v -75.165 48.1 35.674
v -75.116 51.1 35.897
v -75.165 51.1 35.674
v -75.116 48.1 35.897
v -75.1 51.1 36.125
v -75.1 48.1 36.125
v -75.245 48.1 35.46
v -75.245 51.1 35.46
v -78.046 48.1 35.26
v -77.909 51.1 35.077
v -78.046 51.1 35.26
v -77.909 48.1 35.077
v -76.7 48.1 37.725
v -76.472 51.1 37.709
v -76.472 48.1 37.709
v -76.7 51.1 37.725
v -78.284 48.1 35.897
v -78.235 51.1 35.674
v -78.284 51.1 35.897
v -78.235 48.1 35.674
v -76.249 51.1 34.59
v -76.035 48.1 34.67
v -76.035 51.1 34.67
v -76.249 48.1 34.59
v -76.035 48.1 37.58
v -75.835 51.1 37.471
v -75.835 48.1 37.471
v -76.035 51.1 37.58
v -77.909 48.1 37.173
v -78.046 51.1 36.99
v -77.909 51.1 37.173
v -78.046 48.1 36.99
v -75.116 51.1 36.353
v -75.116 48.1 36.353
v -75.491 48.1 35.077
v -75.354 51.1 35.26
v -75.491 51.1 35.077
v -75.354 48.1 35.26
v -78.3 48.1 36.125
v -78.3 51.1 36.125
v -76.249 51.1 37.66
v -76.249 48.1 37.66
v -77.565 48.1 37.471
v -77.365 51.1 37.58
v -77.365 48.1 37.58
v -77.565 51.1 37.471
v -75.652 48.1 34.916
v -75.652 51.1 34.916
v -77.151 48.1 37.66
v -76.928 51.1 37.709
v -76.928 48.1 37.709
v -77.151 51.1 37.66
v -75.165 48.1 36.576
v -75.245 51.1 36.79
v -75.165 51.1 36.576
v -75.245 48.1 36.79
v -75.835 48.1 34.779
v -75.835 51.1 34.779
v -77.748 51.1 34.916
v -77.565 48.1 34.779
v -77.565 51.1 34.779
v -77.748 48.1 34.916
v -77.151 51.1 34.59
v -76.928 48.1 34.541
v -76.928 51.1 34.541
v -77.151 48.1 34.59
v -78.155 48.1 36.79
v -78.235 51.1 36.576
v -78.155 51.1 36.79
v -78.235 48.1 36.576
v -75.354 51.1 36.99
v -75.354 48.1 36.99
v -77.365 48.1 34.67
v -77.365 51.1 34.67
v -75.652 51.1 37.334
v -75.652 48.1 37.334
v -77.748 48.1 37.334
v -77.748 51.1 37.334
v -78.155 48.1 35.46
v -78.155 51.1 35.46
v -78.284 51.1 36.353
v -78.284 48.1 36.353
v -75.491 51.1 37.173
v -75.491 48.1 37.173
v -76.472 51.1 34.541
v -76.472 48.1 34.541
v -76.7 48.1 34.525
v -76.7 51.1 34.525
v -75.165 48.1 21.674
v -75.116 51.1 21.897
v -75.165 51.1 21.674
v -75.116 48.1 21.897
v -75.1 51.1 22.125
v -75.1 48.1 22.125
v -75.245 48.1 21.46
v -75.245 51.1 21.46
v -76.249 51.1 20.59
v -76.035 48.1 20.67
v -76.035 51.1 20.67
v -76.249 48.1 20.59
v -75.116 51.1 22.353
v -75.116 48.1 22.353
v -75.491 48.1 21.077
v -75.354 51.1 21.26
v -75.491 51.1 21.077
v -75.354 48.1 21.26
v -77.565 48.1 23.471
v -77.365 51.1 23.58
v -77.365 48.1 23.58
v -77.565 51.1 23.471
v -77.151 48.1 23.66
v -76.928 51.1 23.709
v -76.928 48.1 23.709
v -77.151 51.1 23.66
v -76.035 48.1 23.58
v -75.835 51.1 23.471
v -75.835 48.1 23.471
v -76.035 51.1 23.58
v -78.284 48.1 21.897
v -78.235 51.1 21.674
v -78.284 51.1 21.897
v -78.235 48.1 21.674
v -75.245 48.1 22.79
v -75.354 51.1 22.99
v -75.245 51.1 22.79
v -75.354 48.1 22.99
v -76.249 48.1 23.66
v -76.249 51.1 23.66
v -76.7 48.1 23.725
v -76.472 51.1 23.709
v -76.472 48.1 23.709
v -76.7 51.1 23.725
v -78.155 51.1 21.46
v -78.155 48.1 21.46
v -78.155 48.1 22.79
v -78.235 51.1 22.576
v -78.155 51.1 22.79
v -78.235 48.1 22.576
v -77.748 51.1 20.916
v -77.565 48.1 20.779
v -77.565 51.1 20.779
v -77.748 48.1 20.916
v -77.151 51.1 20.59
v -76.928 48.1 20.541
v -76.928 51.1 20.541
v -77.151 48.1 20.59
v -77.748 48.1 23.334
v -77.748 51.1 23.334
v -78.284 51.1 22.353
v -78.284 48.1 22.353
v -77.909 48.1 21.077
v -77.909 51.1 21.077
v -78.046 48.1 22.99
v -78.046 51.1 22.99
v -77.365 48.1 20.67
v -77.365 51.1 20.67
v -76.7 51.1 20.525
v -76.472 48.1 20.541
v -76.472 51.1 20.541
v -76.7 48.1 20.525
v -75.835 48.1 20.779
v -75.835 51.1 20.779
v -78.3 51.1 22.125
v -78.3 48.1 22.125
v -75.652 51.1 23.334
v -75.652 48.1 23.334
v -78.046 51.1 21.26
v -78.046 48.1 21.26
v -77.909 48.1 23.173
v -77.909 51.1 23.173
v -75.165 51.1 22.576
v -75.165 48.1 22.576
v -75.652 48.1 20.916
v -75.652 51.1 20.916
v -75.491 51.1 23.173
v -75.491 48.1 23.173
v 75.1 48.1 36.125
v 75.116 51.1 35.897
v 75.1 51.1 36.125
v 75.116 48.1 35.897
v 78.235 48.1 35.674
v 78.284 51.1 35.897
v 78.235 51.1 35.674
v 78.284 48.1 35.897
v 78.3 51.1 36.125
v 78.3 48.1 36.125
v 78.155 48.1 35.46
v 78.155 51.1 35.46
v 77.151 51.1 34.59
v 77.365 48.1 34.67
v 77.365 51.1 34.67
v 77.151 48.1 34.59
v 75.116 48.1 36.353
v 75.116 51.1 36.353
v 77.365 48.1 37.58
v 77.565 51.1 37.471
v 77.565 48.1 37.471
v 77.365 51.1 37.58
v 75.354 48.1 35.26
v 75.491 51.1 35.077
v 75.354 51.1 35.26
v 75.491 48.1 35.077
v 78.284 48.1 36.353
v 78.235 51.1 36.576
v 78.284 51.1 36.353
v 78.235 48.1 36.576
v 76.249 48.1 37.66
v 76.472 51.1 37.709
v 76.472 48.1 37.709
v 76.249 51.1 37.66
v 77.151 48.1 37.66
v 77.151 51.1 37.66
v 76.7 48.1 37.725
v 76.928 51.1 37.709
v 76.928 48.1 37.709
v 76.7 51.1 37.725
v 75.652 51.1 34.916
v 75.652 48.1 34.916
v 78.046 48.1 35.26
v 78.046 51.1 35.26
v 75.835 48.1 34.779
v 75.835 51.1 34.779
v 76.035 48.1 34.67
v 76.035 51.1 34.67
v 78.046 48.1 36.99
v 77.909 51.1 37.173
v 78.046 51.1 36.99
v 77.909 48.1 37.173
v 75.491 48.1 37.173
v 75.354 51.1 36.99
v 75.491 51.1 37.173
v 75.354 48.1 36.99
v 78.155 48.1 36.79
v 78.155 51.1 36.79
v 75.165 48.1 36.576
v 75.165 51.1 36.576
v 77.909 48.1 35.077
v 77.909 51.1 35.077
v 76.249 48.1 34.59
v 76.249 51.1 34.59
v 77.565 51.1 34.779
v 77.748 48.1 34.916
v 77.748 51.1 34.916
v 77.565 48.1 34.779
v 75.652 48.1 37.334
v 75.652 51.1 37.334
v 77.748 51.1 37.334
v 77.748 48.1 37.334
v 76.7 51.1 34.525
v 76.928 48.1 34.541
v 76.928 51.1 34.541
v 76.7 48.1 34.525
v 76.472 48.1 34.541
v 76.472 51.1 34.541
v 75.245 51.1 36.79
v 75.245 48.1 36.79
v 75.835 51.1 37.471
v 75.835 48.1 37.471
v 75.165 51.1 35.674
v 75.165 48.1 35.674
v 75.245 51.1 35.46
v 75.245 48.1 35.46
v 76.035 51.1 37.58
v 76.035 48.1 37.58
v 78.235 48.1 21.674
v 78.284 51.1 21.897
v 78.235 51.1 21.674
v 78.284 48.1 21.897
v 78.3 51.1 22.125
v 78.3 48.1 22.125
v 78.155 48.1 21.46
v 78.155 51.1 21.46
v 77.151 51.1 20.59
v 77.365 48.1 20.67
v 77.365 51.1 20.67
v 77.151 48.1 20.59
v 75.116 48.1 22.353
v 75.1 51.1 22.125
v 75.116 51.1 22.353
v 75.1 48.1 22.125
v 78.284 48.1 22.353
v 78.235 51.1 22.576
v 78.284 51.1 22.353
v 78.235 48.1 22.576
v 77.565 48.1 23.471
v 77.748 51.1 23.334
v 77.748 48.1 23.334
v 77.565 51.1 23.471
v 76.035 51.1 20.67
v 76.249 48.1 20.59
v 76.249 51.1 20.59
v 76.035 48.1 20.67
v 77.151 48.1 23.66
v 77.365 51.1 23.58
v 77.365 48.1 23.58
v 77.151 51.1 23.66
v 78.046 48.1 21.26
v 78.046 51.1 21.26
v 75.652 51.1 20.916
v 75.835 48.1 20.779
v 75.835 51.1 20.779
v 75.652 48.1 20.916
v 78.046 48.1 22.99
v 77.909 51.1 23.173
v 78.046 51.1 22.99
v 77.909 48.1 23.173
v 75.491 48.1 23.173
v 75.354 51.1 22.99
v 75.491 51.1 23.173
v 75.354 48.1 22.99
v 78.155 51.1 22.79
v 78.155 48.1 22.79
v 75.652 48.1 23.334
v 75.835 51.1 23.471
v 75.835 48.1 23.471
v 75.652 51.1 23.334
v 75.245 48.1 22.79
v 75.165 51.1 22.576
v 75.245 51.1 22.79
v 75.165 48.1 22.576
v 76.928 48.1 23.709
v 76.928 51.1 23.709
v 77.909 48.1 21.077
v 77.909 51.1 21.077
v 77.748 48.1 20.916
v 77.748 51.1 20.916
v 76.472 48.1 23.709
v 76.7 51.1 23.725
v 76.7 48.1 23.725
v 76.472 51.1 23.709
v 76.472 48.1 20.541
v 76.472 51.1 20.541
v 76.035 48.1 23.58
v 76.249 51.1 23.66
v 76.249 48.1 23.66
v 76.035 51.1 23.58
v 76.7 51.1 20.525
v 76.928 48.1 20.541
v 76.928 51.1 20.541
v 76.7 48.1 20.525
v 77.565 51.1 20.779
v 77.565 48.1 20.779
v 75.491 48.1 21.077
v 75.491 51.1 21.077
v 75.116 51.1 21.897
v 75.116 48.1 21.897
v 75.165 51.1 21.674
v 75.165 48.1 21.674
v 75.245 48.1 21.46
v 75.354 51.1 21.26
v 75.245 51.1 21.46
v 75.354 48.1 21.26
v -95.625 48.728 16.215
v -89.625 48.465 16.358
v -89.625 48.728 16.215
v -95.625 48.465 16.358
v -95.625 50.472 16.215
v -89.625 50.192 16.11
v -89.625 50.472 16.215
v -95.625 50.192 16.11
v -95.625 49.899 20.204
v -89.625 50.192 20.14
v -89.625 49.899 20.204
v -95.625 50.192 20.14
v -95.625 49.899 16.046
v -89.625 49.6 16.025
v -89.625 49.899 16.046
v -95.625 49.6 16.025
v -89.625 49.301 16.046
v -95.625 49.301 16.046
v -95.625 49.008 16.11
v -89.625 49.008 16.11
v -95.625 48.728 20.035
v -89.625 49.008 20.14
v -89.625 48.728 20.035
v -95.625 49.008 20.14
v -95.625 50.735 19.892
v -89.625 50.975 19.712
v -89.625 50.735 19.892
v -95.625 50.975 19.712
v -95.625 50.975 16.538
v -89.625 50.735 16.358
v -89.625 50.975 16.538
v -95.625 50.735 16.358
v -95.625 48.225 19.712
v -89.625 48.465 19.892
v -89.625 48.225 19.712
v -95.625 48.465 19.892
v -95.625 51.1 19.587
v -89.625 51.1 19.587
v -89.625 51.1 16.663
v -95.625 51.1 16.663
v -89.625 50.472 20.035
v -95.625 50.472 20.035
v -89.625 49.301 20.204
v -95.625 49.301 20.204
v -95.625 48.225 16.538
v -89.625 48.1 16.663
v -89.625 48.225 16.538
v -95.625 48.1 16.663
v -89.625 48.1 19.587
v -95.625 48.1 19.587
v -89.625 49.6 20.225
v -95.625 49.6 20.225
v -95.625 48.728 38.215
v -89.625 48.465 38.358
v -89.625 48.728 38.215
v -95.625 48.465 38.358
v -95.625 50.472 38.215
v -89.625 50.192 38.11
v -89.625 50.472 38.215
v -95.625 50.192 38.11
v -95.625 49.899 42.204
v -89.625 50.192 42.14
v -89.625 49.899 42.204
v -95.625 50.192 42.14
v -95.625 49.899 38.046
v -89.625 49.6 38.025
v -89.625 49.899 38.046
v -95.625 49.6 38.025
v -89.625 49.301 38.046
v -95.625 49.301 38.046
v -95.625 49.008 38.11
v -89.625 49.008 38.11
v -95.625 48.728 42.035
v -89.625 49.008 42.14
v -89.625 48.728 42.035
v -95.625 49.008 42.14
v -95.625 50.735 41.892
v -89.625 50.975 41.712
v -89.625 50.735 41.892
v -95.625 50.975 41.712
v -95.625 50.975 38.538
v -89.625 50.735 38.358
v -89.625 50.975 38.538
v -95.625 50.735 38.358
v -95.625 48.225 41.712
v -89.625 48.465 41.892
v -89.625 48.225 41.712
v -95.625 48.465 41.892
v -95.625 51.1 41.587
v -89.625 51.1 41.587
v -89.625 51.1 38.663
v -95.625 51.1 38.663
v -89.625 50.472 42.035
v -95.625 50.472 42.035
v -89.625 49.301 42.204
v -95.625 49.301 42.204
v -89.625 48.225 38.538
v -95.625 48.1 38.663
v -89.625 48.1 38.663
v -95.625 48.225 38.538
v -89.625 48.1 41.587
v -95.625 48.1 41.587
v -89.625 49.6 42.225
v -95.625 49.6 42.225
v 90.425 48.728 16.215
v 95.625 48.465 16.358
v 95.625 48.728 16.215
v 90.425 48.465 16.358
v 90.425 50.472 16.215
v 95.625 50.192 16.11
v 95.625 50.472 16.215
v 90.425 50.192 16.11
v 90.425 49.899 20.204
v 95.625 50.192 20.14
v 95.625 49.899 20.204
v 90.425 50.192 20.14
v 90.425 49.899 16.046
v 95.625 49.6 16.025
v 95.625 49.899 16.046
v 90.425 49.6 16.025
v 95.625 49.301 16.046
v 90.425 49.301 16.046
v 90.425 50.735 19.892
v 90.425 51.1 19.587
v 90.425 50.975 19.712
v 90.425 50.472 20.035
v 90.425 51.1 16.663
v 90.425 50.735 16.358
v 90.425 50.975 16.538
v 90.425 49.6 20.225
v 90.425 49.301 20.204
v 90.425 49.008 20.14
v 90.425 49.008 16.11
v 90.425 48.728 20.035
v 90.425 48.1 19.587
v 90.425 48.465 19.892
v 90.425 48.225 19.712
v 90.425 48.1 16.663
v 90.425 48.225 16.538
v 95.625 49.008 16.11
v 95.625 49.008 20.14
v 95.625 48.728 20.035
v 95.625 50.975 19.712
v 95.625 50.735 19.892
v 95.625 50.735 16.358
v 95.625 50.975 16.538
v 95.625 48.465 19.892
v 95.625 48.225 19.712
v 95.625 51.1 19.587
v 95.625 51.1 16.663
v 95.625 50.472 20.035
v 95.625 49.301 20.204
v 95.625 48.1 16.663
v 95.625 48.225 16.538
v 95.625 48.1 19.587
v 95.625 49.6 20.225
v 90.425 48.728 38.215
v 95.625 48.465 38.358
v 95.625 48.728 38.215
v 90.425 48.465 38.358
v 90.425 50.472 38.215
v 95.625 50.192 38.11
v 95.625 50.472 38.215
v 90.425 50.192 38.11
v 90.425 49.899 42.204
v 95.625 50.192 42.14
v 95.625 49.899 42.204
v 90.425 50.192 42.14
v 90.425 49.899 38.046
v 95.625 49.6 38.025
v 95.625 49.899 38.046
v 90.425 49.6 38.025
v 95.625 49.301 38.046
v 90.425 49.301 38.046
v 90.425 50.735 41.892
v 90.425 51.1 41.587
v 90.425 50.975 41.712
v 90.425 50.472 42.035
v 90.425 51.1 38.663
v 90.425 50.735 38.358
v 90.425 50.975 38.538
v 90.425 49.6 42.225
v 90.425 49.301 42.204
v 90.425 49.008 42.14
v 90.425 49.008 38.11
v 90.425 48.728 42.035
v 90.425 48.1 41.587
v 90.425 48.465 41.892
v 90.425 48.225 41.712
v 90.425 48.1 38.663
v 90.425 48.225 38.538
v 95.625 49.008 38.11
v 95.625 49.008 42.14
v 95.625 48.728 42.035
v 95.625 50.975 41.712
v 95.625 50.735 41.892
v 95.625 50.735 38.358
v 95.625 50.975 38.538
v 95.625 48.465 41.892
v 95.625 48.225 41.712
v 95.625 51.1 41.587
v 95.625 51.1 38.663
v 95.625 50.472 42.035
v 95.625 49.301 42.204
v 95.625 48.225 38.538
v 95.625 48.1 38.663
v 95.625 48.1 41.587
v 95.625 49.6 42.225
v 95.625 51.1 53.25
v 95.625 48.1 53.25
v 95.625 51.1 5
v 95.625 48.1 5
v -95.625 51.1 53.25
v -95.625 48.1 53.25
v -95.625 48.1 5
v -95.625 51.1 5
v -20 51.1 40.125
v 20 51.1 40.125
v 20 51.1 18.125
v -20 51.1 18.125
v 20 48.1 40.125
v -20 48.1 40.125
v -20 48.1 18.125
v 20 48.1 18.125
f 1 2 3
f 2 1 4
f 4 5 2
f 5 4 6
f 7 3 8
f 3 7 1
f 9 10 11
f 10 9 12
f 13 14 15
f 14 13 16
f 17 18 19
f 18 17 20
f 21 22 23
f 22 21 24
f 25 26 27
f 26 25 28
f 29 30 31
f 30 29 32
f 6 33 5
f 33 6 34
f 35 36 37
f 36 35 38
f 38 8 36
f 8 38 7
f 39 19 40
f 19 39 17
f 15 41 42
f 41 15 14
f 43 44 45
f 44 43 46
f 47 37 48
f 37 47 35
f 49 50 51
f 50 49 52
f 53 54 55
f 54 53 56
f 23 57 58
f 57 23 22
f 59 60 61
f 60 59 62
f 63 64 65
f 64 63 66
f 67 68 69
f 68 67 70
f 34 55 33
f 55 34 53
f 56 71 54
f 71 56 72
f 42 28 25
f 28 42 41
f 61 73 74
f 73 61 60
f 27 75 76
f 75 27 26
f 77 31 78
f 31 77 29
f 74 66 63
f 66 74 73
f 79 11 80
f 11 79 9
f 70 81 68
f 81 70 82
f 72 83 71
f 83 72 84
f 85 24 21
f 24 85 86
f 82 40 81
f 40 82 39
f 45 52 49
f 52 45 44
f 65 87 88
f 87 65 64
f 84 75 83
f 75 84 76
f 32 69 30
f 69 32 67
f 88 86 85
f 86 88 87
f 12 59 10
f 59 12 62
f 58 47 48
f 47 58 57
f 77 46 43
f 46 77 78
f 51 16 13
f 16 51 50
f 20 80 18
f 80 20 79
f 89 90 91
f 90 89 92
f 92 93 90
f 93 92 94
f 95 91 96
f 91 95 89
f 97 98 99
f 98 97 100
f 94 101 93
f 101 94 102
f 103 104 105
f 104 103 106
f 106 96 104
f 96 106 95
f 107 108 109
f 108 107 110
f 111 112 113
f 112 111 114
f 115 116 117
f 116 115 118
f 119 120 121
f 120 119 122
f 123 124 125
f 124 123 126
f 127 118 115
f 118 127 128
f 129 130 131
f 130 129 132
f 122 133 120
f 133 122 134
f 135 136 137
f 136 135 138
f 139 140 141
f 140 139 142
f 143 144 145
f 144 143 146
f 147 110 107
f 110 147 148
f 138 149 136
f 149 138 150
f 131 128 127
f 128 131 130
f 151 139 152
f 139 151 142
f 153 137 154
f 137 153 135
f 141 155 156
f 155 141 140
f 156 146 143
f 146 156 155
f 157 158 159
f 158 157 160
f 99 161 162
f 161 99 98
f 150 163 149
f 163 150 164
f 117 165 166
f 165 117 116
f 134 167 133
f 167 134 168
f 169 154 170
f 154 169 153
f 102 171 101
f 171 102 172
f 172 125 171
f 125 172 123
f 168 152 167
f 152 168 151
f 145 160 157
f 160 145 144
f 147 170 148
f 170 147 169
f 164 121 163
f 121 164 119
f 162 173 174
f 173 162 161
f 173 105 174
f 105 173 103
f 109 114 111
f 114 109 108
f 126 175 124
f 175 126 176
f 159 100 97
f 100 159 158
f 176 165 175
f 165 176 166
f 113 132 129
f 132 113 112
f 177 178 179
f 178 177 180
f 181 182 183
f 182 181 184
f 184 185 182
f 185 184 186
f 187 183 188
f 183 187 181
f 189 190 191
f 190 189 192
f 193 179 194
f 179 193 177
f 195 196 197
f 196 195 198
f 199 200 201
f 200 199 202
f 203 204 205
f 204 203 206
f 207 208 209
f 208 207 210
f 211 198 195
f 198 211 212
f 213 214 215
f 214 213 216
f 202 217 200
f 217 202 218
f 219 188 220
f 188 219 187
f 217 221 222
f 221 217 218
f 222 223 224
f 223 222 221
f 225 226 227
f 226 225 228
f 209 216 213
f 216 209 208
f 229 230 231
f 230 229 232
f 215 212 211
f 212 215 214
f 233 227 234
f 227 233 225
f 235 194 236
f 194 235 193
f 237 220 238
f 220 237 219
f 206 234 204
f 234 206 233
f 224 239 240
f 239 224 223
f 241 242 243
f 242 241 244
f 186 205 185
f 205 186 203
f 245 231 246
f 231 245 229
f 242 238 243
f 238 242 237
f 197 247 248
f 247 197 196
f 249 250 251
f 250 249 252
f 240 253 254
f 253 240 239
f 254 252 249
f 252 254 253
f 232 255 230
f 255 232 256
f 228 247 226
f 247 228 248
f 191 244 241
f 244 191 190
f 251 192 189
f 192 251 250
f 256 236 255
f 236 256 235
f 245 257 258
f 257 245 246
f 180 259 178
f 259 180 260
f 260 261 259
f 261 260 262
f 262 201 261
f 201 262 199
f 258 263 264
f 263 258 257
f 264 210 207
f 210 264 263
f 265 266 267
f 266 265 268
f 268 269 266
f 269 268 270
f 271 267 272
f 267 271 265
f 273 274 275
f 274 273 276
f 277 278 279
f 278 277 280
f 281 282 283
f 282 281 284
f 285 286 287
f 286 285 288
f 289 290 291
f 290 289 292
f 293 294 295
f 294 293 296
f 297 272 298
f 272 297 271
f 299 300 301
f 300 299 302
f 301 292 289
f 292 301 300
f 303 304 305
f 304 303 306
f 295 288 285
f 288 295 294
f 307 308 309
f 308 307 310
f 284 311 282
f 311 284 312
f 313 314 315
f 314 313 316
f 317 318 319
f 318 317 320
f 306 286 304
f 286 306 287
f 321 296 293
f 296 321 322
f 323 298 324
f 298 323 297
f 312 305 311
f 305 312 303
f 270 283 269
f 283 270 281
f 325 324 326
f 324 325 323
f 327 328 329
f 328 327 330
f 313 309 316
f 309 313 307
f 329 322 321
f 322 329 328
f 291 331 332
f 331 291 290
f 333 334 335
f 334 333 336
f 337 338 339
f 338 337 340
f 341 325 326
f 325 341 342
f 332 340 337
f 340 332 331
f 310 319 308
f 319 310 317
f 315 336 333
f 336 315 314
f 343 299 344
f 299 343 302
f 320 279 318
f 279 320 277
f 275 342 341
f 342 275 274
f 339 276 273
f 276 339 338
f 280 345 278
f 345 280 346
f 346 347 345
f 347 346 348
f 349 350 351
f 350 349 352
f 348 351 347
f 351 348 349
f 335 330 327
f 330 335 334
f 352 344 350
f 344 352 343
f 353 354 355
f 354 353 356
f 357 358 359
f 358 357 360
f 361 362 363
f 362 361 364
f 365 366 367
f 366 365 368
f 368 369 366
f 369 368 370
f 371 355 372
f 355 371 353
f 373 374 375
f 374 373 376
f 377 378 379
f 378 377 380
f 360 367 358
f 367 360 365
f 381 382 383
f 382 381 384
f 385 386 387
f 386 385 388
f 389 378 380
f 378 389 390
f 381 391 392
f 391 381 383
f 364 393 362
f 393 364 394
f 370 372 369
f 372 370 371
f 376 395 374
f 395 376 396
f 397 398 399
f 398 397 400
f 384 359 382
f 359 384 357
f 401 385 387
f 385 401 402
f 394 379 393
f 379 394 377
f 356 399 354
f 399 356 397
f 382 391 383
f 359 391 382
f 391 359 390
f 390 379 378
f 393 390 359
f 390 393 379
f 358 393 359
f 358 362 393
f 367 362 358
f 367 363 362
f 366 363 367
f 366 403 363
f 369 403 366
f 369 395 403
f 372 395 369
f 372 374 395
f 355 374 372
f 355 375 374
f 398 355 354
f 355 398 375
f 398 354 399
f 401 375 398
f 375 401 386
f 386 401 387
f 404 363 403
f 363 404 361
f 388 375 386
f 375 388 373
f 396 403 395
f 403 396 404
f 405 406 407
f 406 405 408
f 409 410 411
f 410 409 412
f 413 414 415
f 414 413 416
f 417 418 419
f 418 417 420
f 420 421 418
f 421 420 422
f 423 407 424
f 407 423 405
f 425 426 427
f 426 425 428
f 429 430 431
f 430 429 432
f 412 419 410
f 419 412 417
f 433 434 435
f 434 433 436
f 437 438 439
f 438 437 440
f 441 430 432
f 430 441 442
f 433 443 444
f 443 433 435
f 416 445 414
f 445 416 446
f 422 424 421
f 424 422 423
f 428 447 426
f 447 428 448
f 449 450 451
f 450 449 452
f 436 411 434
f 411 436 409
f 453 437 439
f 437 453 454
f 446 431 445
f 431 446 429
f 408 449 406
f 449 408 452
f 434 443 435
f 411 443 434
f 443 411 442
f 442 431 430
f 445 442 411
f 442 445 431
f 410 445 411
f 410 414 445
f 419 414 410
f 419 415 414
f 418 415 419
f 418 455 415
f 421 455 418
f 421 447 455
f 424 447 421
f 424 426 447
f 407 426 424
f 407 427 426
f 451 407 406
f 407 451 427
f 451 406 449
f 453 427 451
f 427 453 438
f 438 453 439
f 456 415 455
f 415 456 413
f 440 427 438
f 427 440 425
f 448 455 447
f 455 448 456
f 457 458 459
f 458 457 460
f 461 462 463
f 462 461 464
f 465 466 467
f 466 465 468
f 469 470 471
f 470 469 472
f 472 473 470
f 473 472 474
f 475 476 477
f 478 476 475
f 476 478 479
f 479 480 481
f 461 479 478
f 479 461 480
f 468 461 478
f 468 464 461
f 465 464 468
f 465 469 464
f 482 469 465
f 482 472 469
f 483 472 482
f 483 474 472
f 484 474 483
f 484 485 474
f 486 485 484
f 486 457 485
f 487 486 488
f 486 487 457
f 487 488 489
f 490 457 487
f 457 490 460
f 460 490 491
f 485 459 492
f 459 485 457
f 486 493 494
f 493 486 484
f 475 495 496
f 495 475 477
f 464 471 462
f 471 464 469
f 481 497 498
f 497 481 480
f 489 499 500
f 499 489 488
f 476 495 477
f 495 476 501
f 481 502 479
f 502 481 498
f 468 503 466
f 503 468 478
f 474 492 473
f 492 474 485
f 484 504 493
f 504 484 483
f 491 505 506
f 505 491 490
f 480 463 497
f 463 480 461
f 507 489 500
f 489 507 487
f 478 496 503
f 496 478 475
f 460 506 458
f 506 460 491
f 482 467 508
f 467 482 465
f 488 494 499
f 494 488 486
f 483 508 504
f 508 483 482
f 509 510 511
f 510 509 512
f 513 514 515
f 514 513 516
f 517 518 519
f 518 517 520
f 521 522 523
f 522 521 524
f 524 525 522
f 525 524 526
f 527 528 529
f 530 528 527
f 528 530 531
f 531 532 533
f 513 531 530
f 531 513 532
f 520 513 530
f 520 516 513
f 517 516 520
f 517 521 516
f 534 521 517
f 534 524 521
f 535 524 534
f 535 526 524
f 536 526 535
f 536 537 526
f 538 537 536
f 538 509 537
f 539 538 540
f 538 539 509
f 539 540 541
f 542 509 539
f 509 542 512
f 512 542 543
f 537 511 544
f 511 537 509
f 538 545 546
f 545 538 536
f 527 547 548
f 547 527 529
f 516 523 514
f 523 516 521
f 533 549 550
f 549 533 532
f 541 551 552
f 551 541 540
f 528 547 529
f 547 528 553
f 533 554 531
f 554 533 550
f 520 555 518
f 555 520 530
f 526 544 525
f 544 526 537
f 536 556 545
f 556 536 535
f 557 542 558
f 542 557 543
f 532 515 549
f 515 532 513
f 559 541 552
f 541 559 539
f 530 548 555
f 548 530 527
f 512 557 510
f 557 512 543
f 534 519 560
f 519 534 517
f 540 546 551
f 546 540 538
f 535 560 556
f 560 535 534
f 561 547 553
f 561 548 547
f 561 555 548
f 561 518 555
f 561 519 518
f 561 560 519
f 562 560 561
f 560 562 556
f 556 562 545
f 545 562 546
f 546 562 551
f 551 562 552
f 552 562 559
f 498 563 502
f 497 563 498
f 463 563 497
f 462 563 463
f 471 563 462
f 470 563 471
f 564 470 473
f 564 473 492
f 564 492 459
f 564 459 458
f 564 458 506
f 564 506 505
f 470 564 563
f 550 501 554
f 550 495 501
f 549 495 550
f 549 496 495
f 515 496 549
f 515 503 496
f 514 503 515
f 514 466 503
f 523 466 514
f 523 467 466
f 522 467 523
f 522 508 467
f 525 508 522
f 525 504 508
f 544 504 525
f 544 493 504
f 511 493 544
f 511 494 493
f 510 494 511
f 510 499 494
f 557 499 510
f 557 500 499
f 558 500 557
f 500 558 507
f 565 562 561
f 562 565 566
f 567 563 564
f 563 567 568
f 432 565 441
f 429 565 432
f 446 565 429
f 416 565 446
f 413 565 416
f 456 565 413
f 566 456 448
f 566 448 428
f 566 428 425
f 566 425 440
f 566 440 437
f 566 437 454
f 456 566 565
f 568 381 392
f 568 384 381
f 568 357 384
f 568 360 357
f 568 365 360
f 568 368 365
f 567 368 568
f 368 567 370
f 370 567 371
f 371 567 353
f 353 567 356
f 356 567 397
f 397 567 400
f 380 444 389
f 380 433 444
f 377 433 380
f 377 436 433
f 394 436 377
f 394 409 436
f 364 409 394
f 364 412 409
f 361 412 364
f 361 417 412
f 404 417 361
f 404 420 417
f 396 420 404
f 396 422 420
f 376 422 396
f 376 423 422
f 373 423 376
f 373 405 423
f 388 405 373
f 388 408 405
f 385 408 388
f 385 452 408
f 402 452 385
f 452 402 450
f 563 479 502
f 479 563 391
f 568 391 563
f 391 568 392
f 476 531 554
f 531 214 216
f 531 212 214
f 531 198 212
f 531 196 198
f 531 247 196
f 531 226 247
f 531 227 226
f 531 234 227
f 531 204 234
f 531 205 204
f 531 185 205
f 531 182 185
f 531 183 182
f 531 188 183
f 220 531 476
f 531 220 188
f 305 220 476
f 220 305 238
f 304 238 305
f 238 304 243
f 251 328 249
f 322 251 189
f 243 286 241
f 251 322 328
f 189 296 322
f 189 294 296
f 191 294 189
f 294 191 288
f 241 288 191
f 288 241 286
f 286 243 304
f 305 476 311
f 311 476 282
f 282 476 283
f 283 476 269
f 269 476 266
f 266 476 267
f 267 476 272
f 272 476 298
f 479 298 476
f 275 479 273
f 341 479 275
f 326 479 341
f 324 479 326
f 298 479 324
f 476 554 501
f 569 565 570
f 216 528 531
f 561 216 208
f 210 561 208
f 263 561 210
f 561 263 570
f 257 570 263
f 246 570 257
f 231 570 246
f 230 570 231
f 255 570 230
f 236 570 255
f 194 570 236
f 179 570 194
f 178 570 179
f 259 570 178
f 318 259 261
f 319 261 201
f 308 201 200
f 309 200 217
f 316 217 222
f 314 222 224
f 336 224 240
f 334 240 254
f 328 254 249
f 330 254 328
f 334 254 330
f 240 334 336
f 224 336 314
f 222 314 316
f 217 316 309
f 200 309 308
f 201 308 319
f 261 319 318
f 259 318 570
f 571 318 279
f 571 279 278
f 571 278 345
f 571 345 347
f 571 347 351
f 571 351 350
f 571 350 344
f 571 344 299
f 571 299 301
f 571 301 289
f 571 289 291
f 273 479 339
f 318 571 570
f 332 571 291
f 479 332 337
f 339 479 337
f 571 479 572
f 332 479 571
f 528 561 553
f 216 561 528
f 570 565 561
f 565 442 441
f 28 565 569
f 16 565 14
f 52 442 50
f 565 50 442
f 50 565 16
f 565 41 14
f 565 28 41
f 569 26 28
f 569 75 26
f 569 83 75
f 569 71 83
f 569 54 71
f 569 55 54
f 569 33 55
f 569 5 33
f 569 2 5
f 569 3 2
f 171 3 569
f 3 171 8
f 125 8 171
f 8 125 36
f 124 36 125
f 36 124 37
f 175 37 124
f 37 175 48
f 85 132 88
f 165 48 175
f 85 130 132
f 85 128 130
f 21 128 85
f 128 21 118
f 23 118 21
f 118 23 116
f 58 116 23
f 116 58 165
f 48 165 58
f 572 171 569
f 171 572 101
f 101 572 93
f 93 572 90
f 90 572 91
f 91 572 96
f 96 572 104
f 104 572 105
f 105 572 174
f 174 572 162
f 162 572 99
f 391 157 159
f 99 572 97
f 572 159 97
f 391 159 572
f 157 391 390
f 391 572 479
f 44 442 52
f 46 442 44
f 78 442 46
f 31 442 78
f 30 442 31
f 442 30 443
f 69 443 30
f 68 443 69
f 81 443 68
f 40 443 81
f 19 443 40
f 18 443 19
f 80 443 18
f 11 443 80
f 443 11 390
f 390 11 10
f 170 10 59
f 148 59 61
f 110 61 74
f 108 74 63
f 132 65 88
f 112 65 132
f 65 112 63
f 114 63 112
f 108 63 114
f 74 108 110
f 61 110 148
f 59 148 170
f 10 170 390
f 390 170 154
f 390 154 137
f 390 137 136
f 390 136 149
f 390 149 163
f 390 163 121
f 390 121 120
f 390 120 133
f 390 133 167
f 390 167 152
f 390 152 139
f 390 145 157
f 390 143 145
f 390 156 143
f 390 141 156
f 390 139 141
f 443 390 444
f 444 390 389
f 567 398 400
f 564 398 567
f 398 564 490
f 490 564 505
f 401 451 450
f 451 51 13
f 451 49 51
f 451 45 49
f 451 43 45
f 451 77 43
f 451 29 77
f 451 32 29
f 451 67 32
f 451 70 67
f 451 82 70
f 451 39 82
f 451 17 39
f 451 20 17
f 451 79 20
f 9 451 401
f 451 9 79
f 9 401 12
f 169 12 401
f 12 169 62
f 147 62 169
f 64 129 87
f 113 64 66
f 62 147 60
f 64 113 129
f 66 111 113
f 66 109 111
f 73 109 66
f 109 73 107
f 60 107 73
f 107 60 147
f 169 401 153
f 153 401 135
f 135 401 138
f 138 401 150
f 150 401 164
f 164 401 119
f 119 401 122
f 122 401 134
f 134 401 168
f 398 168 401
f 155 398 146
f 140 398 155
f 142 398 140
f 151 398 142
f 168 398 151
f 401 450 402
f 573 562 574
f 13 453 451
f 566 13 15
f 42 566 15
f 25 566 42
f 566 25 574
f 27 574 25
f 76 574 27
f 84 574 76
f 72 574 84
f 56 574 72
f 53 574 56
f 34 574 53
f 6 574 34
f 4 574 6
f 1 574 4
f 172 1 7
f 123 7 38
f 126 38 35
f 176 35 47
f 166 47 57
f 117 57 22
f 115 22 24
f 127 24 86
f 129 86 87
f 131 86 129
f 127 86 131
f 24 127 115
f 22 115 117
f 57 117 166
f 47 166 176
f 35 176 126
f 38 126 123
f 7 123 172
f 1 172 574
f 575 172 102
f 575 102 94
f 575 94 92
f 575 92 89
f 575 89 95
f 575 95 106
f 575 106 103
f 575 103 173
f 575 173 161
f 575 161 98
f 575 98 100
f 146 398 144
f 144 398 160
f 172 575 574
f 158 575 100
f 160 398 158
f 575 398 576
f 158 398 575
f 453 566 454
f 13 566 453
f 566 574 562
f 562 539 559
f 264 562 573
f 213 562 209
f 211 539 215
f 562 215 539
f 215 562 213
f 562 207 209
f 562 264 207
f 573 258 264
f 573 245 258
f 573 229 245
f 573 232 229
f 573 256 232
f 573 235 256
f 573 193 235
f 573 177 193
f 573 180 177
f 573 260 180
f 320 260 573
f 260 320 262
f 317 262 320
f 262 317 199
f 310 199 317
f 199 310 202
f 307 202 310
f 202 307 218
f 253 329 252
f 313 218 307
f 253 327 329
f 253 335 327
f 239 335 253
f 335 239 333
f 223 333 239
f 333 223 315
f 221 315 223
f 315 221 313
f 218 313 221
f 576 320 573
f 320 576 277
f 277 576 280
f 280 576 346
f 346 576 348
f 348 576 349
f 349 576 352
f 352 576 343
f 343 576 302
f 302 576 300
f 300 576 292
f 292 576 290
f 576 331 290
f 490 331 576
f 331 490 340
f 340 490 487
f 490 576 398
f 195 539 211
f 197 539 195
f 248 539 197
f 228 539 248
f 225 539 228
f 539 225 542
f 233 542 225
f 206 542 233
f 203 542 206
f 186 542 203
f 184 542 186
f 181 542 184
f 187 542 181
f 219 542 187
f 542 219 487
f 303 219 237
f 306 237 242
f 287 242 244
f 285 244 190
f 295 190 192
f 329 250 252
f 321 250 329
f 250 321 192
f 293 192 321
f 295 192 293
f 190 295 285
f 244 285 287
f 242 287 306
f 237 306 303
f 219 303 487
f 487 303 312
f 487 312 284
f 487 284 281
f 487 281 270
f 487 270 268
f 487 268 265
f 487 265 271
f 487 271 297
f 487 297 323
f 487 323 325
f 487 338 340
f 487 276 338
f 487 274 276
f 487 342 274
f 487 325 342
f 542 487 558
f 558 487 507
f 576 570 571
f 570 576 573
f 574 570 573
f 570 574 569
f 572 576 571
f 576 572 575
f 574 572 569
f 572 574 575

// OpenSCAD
// box_body.scad v5.7
//  HANDHELD/ROVER RIG  v3.9  (EXACT base - do not change measurements)
$fn=44; eps=0.8; inch=25.4;
wall=5; floor_th=4; edge=8; win_r=6; clr=1.5; pt=2.5;
m3=3.4; cb_d=7; cb_h=2.5; boss_od=8; insert_h=6; ins_d=4.2;
plate_t=3; wash_d=8; wash_h=2.0;
nut_hex=6.6; nut_th=2.6; wcb_d=9; wcb_h=3;
ant_dx = 34;  ant_dz = 8;  ant_x = 0;
zed_w=175.25; zed_h=30.25; zed_d=43.1; zed_base=120;
rad_w=90; rad_h=102; rad_d=34; ant_win=32;
agx_w=105; agx_d=105; agx_h=65; agx_so=6; agx_mt=97;
jack_gap=42; rad_stick=3; rad_standoff=15;
zed_conn_w=40; zed_conn_h=22;
rad_hole_dx=76.30; rad_hole_dy=56.89;
cord_gap=63.5;
imu_cx=-60; imu_screw=2.4;
imu_hole_dx=22.86; imu_hole_dy=27.94;
half = max(zed_w/2, ant_dx + ant_x + rad_w/2) + edge; IW = 2*half; OW = IW + 2*wall;
agx_top=floor_th+agx_so+agx_h;
zed_z0=floor_th+10; zed_cz=zed_z0+zed_h/2;
rad_z0=zed_z0+zed_h+jack_gap; rad_cz=rad_z0+rad_h/2;
OH=rad_cz+(rad_hole_dy+22)/2+8;
zed_y0=wall; zed_back=zed_y0+zed_d; rad_back=-rad_stick+rad_d;
agx_rear=63.5;
agx_cy=zed_back+cord_gap+agx_d/2; OD=agx_cy+agx_d/2+agx_rear+wall;
rad_cx=ant_dx+ant_x;
hm_dz=46; handle_reach=95; hsec=18; grip_rise=52; grip_back=190;
handle_y=agx_cy-10; handle_z=OH*0.52;
module rbox(w,d,h,r=4){ hull() for(x=[r,w-r],y=[r,d-r]) translate([x,y,0]) cylinder(r=r,h=h); }
module holes4(dx,dy){ for(x=[-dx/2,dx/2],y=[-dy/2,dy/2]) translate([x,y,0]) children(); }
module ycut(w,h,depth,r){ hull() for(a=[-1,1],b=[-1,1]) translate([a*(w/2-r),0,b*(h/2-r)]) rotate([-90,0,0]) cylinder(r=r,h=depth); }
module shell(){ translate([-OW/2,0,0]) rbox(OW,OD,OH,8); }
module cavity(){ translate([-IW/2,wall,floor_th]) rbox(IW,OD-2*wall,OH+eps,4); }
module rad_window(){ translate([rad_cx,-eps,rad_cz]) ycut(rad_w+clr, rad_h+clr, wall+2*eps, 10); }
module rad_standoffs(){ translate([rad_cx, rad_back, rad_cz]) rotate([-90,0,0]) holes4(rad_hole_dx, rad_hole_dy)
        difference(){ cylinder(d=8,h=rad_standoff); translate([0,0,-eps]) cylinder(d=2.6,h=rad_standoff+2*eps); } }
module rad_plate(){ fh=rad_hole_dy+22; py=rad_back+rad_standoff;
    difference(){
        translate([-IW/2-2, py, rad_cz-fh/2]) cube([IW+4, plate_t, fh]);
        translate([rad_cx, py-eps, rad_cz]) rotate([-90,0,0]) holes4(rad_hole_dx,rad_hole_dy) cylinder(d=m3,h=plate_t+2*eps);
        translate([rad_cx, py+plate_t-wash_h, rad_cz]) rotate([-90,0,0]) holes4(rad_hole_dx,rad_hole_dy) cylinder(d=wash_d,h=wash_h+eps);
    } }
module imu_mount(){ translate([imu_cx,-eps,rad_cz]) rotate([-90,0,0]) holes4(imu_hole_dx,imu_hole_dy) cylinder(d=1.7,h=wall+2*eps);
    translate([imu_cx,-eps,rad_cz]) rotate([-90,0,0]) holes4(imu_hole_dx,imu_hole_dy) cylinder(d=wcb_d,h=wcb_h+eps); }
module zed_window(){ translate([0,-eps,zed_cz]) ycut(zed_base+44, zed_h-2, wall+2*eps, 6); }
zed_mt_dx=153.4; zed_mt_dz=14;
module zed_plate(){ fh=zed_h+18; py=zed_back;
    difference(){
        translate([-IW/2-2, py, zed_cz-fh/2]) cube([IW+4, plate_t, fh]);
        translate([-zed_conn_w/2, py-eps, zed_cz-zed_conn_h/2]) cube([zed_conn_w, plate_t+2*eps, zed_conn_h]);
        translate([0, py-eps, zed_cz]) rotate([-90,0,0]) holes4(zed_mt_dx, zed_mt_dz) cylinder(d=m3,h=plate_t+2*eps);
        translate([0, py+plate_t-wash_h, zed_cz]) rotate([-90,0,0]) holes4(zed_mt_dx, zed_mt_dz) cylinder(d=wash_d,h=wash_h+eps);
    } }
module agx_screws(){ translate([0,agx_cy,-eps]) holes4(agx_mt,agx_mt) cylinder(d=m3,h=floor_th+agx_so+2*eps);
                     translate([0,agx_cy,-eps]) holes4(agx_mt,agx_mt) cylinder(d=wcb_d,h=wcb_h); }
module agx_mount(){ translate([0,agx_cy,floor_th]) holes4(agx_mt,agx_mt) difference(){
        cylinder(d=boss_od,h=agx_so); translate([0,0,-1]) cylinder(d=2.6,h=agx_so+3); } }
module rear_cables(){ translate([0,OD-wall-eps,floor_th+20]) ycut(104,30,wall+2*eps,8); }
module handle_mounts(){ for(s=[-1,1]) for(dz=[-hm_dz/2,hm_dz/2]) translate([s*(OW/2+eps),handle_y,handle_z+dz]) rotate([0,-90*s,0]) cylinder(d=m3,h=wall+2*eps); }
module handle_nuts(){ for(s=[-1,1]) for(dz=[-hm_dz/2,hm_dz/2])
    translate([s*(IW/2),handle_y,handle_z+dz]) rotate([0,90*s,0]) difference(){
        cylinder(d=12,h=7); translate([0,0,-eps]) cylinder(d=m3,h=8);
        translate([0,0,7-nut_th]) cylinder(d=nut_hex,h=nut_th+1,$fn=6); } }
module box_body(){ union(){
        difference(){ shell(); cavity(); rad_window(); imu_mount(); zed_window(); rear_cables(); agx_screws(); handle_mounts(); }
        agx_mount(); handle_nuts(); rad_plate(); rad_standoffs(); zed_plate();
    } }
module handle(){ ft=6; fw=26; fh=hm_dz+34;
    difference(){ translate([0,-fw/2,-fh/2]) cube([ft,fw,fh]);
        for(dz=[-hm_dz/2,hm_dz/2]){ translate([-eps,0,dz]) rotate([0,90,0]) cylinder(d=m3,h=ft+2*eps);
            translate([ft-wcb_h,0,dz]) rotate([0,90,0]) cylinder(d=wcb_d,h=wcb_h+eps); } }
    translate([ft-1,-hsec/2,-hsec/2]) cube([handle_reach-ft+1, hsec, hsec]);
    translate([handle_reach-hsec,-hsec/2,-hsec/2]) cube([hsec, grip_back+hsec/2, hsec]);
    translate([handle_reach-hsec, grip_back-hsec/2,-hsec/2]) cube([hsec, hsec, grip_rise+hsec/2]); }
module handles(){ translate([55,0,0]) handle(); translate([-55,0,0]) mirror([1,0,0]) handle(); }

// ===================== SPLIT / BOLT-TOGETHER (v3.9 exact, sliced) =====================
jclr=3.4; jins=4.2; jins_h=6;                 // M3 screw + M3 heat-set insert
yfs=28; ybs=OD-28;                            // front/back seam (past r=8 corner)
zc=[floor_th+40, OH-40];                       // 2 corner screws per seam
tab_in=8; tab_ov=12;
xCL=-(OW/2-wall/2); xCR=(OW/2-wall/2);
rad_py=rad_back+rad_standoff;                  // 46
rad_pz=[rad_cz-30, rad_cz+30];
zed_pz=[zed_cz-11, zed_cz+11];
fp_front=[[-60,2.5],[60,2.5]]; fp_back=[[-60,OD-2.5],[60,OD-2.5]];
fp_left=[[xCL,70],[xCL,OD-70]]; fp_right=[[xCR,70],[xCR,OD-70]];

module wallsolid(){ union(){
    difference(){ shell(); cavity(); rad_window(); imu_mount(); zed_window(); rear_cables(); agx_screws(); handle_mounts(); }
    handle_nuts();
} }
module R_floor(){ translate([-OW,-20,-2]) cube([2*OW,OD+40,floor_th+2]); }
module R_front(){ translate([-OW,-20,floor_th]) cube([2*OW,yfs+20,OH+2]); }
module R_back(){  translate([-OW,ybs,floor_th]) cube([2*OW,OD-ybs+20,OH+2]); }
module R_left(){  translate([-OW-2,yfs,floor_th]) cube([OW+2,ybs-yfs,OH+2]); }
module R_right(){ translate([0,yfs,floor_th]) cube([OW+2,ybs-yfs,OH+2]); }
module Rside(s){ if(s<0) R_left(); else R_right(); }
module Xin(s,y,z,dia,len){ translate([s*OW/2,y,z]) rotate([0,-s*90,0]) cylinder(d=dia,h=len); }
module Zup(x,y,dia,len){ translate([x,y,floor_th-eps]) cylinder(d=dia,h=len); }
module Zdn(x,y,dia,len){ translate([x,y,-eps]) cylinder(d=dia,h=len); }

module corner_tab(s, yseam, ydir){
    xi=s*(OW/2-wall); xc=(s<0)? xi : xi-tab_in;
    y0=(ydir>0)? yseam-tab_ov : yseam;
    ym=(ydir>0)? yseam-tab_ov/2 : yseam+tab_ov/2;
    difference(){
        translate([xc, y0, floor_th]) cube([tab_in, tab_ov, OH-floor_th]);
        for(z=zc) translate([xi,ym,z]) rotate([0,-s*90,0]) cylinder(d=jins,h=tab_in+eps);
    }
}
module joins_floorclear(){ for(p=concat(fp_front,fp_back,fp_left,fp_right)){ Zdn(p[0],p[1],jclr,floor_th+2*eps); Zdn(p[0],p[1],wcb_d,wcb_h); } }

module p_floor(){ difference(){ union(){ intersection(){ wallsolid(); R_floor(); } agx_mount(); } joins_floorclear(); } }
module p_front(){ difference(){ intersection(){ wallsolid(); R_front(); }
    for(s=[-1,1],z=zc) Xin(s, yfs-tab_ov/2, z, jclr, wall+2*eps);
    for(p=fp_front) Zup(p[0],p[1],jins,jins_h+eps);
} }
module p_back(){ difference(){ intersection(){ wallsolid(); R_back(); }
    for(s=[-1,1],z=zc) Xin(s, ybs+tab_ov/2, z, jclr, wall+2*eps);
    for(p=fp_back) Zup(p[0],p[1],jins,jins_h+eps);
} }
module side(s){ difference(){
        union(){ intersection(){ wallsolid(); Rside(s); } corner_tab(s,yfs,+1); corner_tab(s,ybs,-1); }
        for(p=(s<0?fp_left:fp_right)) Zup(p[0],p[1],jins,jins_h+eps);
        for(z=rad_pz) Xin(s, rad_py+plate_t/2, z, jclr, wall+2*eps);
        for(z=zed_pz) Xin(s, zed_back+plate_t/2, z, jclr, wall+2*eps);
    } }
module p_left(){ side(-1); }
module p_right(){ side(1); }

// separate plates: IDENTICAL positions/holes, just IW-wide (fit between walls) + end inserts
module p_rad(){ fh=rad_hole_dy+22; py=rad_py; union(){
    difference(){
        translate([-IW/2, py, rad_cz-fh/2]) cube([IW, plate_t, fh]);
        translate([rad_cx, py-eps, rad_cz]) rotate([-90,0,0]) holes4(rad_hole_dx,rad_hole_dy) cylinder(d=2.8,h=plate_t+2*eps);   // smaller (M3 self-tap)
        for(s=[-1,1],z=rad_pz) translate([s*(IW/2)+(s<0?-eps:eps-jins_h), py+plate_t/2, z]) rotate([0,90,0]) cylinder(d=jins,h=jins_h+eps);
    }
    rad_standoffs();
} }
module p_zed(){ fh=zed_h+18; py=zed_back; difference(){
    translate([-IW/2, py, zed_cz-fh/2]) cube([IW, plate_t, fh]);
    translate([-zed_conn_w/2, py-eps, zed_cz-zed_conn_h/2]) cube([zed_conn_w, plate_t+2*eps, zed_conn_h]);
    translate([0, py-eps, zed_cz]) rotate([-90,0,0]) holes4(zed_mt_dx, zed_mt_dz) cylinder(d=3.2,h=plate_t+2*eps);   // smaller (snug M3)
    for(s=[-1,1],z=zed_pz) translate([s*(IW/2)+(s<0?-eps:eps-jins_h), py+plate_t/2, z]) rotate([0,90,0]) cylinder(d=jins,h=jins_h+eps);
} }

module split_assembly(){ p_floor(); p_front(); p_back(); p_left(); p_right(); p_rad(); p_zed();
    translate([ OW/2,handle_y,handle_z]) handle(); translate([-OW/2,handle_y,handle_z]) mirror([1,0,0]) handle(); }

part="zed_plate";
if      (part=="assembly")  split_assembly();
else if (part=="floor")     p_floor();
else if (part=="front")     p_front();
else if (part=="back")      p_back();
else if (part=="left")      p_left();
else if (part=="right")     p_right();
else if (part=="rad_plate") p_rad();
else if (part=="zed_plate") p_zed();
else if (part=="handles")   handles();
else if (part=="handle")    handle();
